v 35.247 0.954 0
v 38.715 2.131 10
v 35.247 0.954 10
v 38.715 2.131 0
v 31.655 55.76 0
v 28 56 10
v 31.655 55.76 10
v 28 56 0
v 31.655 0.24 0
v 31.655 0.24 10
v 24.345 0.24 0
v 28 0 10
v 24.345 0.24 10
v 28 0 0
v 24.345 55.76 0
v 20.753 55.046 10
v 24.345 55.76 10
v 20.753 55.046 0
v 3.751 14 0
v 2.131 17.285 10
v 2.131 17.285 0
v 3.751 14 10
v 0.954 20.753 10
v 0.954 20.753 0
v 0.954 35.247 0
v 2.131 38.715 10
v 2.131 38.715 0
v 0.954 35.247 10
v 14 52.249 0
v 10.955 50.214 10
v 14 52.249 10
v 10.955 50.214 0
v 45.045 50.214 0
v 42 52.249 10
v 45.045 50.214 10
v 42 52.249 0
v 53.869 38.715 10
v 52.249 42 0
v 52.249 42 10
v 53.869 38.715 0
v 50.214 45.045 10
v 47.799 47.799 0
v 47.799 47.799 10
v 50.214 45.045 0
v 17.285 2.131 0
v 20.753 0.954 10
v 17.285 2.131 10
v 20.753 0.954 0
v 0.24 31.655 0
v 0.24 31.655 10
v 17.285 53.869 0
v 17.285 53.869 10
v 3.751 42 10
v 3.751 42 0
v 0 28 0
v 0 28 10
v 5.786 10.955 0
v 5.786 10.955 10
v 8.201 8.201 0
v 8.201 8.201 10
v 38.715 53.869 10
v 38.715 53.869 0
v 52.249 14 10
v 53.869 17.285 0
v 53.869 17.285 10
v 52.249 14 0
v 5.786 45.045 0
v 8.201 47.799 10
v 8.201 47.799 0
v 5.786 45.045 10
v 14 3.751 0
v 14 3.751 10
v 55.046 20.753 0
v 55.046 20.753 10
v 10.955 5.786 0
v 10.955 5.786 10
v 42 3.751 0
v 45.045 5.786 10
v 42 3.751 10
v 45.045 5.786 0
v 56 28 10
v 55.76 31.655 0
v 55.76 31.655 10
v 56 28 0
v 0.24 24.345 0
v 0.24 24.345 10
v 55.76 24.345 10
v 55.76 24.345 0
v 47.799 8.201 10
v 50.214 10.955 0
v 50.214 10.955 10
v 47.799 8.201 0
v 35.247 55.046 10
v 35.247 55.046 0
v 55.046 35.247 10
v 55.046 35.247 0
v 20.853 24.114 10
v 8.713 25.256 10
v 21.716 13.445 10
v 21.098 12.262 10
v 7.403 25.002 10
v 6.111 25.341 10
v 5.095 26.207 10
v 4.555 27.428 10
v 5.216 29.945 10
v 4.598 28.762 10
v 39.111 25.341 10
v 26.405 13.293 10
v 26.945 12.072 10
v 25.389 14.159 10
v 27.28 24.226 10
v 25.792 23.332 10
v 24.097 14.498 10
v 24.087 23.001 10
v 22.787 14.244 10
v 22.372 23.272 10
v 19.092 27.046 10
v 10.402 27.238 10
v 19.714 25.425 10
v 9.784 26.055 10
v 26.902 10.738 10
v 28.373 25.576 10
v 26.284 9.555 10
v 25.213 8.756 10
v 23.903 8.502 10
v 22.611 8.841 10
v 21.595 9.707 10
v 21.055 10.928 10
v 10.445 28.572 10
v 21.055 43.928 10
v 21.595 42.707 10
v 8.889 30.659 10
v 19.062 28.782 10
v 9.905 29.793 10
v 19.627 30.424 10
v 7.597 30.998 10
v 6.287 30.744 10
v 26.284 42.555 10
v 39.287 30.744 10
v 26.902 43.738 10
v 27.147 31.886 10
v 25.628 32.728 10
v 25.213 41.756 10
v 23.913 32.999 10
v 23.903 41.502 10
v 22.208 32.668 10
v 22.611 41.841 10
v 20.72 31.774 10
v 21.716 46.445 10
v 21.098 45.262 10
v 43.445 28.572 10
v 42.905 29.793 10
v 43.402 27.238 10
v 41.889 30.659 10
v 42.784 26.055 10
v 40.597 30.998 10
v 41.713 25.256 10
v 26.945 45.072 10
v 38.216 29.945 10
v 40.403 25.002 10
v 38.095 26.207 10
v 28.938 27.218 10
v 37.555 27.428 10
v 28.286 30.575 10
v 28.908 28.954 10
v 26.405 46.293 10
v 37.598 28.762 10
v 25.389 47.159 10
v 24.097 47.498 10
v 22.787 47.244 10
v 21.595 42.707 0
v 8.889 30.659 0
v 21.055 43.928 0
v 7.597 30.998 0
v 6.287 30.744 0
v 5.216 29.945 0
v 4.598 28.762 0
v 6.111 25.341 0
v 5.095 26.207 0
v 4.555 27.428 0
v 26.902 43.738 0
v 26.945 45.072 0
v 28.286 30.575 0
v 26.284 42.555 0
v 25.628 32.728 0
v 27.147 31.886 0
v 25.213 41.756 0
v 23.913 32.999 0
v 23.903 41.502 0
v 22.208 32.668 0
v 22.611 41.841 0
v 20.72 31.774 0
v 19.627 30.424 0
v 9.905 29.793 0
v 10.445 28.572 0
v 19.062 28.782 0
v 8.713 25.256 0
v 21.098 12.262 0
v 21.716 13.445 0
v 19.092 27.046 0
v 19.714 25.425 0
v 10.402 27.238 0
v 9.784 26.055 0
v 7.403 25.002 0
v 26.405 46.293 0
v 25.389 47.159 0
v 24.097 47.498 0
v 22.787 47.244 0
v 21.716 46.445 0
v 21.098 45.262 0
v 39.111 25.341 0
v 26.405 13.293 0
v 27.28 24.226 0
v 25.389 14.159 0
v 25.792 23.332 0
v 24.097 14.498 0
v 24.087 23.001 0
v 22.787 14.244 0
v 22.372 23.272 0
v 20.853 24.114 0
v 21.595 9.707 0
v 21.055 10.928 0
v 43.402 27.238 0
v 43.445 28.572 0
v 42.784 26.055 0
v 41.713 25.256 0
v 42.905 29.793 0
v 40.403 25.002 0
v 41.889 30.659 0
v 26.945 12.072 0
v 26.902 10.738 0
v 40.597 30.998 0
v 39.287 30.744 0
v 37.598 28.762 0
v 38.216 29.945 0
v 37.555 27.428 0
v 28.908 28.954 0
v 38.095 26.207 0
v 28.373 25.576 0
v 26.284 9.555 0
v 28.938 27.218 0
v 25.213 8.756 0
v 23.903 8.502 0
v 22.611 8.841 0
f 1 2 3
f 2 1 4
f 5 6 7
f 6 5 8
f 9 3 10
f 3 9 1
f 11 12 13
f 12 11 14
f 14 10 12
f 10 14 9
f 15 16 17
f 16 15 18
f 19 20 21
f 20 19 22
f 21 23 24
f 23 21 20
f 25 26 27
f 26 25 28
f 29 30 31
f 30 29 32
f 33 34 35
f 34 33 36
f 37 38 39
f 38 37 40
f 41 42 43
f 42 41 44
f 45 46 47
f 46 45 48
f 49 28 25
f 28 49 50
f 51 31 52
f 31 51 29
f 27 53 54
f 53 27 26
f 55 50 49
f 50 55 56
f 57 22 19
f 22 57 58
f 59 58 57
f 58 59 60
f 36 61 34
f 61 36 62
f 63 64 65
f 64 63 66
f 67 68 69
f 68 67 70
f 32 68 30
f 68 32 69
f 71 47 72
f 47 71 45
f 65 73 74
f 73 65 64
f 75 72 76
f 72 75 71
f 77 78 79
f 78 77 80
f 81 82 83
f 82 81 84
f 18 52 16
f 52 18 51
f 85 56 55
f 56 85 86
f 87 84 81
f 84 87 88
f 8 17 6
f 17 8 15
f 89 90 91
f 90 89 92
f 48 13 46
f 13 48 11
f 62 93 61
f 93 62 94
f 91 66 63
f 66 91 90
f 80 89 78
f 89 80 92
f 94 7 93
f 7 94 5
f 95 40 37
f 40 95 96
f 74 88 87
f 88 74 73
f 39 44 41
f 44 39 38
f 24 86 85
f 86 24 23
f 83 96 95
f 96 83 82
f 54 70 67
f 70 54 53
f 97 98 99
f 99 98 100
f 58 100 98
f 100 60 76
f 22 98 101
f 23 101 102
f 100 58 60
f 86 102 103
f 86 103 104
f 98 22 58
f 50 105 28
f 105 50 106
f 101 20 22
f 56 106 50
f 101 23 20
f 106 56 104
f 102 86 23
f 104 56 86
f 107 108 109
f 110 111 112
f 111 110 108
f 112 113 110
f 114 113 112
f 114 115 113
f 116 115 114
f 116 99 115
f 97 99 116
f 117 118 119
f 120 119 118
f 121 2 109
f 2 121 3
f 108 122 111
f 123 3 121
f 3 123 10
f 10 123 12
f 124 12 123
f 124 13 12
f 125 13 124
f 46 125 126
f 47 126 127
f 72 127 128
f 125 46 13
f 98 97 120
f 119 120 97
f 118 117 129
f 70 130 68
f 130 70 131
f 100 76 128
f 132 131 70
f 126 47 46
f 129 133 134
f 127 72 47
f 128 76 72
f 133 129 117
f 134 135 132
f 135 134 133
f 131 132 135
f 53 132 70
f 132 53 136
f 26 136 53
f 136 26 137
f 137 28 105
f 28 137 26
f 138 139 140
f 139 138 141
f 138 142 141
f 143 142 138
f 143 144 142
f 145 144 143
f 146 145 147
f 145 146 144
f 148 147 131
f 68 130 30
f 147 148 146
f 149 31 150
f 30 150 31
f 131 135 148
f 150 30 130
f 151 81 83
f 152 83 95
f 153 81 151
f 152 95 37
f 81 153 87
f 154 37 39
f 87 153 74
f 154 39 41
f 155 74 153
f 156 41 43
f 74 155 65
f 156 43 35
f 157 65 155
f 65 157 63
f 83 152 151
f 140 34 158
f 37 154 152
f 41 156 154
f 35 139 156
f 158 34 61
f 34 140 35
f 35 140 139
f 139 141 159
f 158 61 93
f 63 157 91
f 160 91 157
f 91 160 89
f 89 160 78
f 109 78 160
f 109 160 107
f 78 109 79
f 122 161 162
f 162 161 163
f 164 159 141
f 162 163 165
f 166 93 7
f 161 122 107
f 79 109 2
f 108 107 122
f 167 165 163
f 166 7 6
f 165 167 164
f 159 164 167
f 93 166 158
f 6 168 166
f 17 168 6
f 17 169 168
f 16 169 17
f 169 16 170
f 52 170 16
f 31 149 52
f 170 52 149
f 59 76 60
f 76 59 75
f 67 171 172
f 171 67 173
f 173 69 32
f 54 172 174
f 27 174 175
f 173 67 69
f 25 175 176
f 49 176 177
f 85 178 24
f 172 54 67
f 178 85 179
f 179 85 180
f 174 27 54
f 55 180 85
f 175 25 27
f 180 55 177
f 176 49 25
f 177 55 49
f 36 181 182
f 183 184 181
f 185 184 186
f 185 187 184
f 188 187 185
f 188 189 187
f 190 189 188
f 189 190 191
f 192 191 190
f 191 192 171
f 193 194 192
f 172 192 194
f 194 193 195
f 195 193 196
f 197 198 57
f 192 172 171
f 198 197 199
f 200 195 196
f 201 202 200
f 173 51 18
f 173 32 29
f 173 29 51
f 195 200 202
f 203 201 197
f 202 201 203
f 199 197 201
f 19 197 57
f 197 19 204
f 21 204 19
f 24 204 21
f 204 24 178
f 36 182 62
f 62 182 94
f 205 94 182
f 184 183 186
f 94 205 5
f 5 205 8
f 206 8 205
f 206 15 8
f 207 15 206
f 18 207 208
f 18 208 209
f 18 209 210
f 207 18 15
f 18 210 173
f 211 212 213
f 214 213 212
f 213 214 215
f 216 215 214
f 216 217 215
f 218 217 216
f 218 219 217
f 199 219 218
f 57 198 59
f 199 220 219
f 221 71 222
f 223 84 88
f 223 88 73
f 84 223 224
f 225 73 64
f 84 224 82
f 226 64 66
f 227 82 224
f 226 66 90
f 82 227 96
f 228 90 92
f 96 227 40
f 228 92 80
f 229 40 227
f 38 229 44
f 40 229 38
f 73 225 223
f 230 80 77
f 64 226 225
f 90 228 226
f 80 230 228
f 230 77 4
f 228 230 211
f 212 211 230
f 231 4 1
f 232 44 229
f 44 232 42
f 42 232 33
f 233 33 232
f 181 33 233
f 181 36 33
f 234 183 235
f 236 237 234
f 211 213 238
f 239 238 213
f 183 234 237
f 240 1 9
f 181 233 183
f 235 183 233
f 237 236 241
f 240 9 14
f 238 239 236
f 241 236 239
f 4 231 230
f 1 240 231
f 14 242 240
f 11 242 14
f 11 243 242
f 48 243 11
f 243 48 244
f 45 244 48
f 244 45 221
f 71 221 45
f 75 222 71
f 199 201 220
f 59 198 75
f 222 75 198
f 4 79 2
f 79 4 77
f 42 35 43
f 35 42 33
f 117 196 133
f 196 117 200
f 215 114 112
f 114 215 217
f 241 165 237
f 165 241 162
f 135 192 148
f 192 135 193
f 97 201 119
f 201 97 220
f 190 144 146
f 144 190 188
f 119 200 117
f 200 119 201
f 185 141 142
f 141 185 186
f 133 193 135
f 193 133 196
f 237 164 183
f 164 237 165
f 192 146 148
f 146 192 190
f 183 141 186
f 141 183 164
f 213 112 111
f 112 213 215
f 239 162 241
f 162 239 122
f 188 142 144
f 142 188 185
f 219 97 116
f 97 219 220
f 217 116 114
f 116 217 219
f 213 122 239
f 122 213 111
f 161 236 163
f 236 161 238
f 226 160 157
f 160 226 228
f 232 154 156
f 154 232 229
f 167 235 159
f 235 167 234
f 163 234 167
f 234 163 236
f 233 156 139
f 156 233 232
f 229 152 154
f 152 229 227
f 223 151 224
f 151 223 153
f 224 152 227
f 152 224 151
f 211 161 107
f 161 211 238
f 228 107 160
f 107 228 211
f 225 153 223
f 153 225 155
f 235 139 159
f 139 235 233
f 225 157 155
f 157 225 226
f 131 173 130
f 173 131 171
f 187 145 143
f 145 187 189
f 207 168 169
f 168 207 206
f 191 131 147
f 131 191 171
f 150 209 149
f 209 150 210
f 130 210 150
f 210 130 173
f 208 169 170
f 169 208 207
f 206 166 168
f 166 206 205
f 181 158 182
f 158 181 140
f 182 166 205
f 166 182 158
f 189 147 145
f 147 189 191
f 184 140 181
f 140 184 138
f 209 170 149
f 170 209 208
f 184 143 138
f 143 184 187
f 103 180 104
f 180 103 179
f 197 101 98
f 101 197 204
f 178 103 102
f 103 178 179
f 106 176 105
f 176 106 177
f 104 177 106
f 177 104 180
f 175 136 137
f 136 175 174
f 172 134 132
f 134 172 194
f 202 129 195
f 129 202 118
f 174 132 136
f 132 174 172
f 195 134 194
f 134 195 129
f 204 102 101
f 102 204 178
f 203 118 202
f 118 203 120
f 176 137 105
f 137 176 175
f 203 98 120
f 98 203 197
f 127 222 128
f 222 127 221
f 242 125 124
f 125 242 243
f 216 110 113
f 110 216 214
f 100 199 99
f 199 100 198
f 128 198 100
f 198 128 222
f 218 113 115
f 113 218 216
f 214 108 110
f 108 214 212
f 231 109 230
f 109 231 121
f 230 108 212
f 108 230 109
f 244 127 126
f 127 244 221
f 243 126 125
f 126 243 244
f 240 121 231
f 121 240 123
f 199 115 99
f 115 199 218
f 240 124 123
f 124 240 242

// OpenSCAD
$fn = 32;

// ----------------------------------------------------------------------
// Cam plate: eccentric cam, base R28
// ----------------------------------------------------------------------

// --- parameters (mm) ---
base_r = 28;              // base circle radius
lobe_h = 8;               // cam lobe rise
bore_r = 5;               // shaft bore radius
plate_t = 10;             // plate thickness, Z (extrusion height)
ecc = 4;                  // disc eccentricity
ring_r = 16.5;            // lightening ring radius
bolt_r = 3;               // lightening hole radius
fit_tol = 0.05;           // declared fit tolerance (prompt contract)
free_tol = 0.3;           // declared free tolerance (prompt contract)

profile = [[56, 28], [55.76, 31.655], [55.046, 35.247], [53.869, 38.715], [52.249, 42], [50.214, 45.045], [47.799, 47.799], [45.045, 50.214], [42, 52.249], [38.715, 53.869], [35.247, 55.046], [31.655, 55.76], [28, 56], [24.345, 55.76], [20.753, 55.046], [17.285, 53.869], [14, 52.249], [10.955, 50.214], [8.201, 47.799], [5.786, 45.045], [3.751, 42], [2.131, 38.715], [0.954, 35.247], [0.24, 31.655], [0, 28], [0.24, 24.345], [0.954, 20.753], [2.131, 17.285], [3.751, 14], [5.786, 10.955], [8.201, 8.201], [10.955, 5.786], [14, 3.751], [17.285, 2.131], [20.753, 0.954], [24.345, 0.24], [28, 0], [31.655, 0.24], [35.247, 0.954], [38.715, 2.131], [42, 3.751], [45.045, 5.786], [47.799, 8.201], [50.214, 10.955], [52.249, 14], [53.869, 17.285], [55.046, 20.753], [55.76, 24.345]];  // primary outline, 48 points, counter clockwise
void_1 = [[28.908, 28.954], [28.286, 30.575], [27.147, 31.886], [25.628, 32.728], [23.913, 32.999], [22.208, 32.668], [20.72, 31.774], [19.627, 30.424], [19.062, 28.782], [19.092, 27.046], [19.714, 25.425], [20.853, 24.114], [22.372, 23.272], [24.087, 23.001], [25.792, 23.332], [27.28, 24.226], [28.373, 25.576], [28.938, 27.218]];  // shaft bore, 18 points
void_2 = [[43.445, 28.572], [42.905, 29.793], [41.889, 30.659], [40.597, 30.998], [39.287, 30.744], [38.216, 29.945], [37.598, 28.762], [37.555, 27.428], [38.095, 26.207], [39.111, 25.341], [40.403, 25.002], [41.713, 25.256], [42.784, 26.055], [43.402, 27.238]];  // lightening hole 1, 14 points
void_3 = [[26.945, 45.072], [26.405, 46.293], [25.389, 47.159], [24.097, 47.498], [22.787, 47.244], [21.716, 46.445], [21.098, 45.262], [21.055, 43.928], [21.595, 42.707], [22.611, 41.841], [23.903, 41.502], [25.213, 41.756], [26.284, 42.555], [26.902, 43.738]];  // lightening hole 2, 14 points
void_4 = [[10.445, 28.572], [9.905, 29.793], [8.889, 30.659], [7.597, 30.998], [6.287, 30.744], [5.216, 29.945], [4.598, 28.762], [4.555, 27.428], [5.095, 26.207], [6.111, 25.341], [7.403, 25.002], [8.713, 25.256], [9.784, 26.055], [10.402, 27.238]];  // lightening hole 3, 14 points
void_5 = [[26.945, 12.072], [26.405, 13.293], [25.389, 14.159], [24.097, 14.498], [22.787, 14.244], [21.716, 13.445], [21.098, 12.262], [21.055, 10.928], [21.595, 9.707], [22.611, 8.841], [23.903, 8.502], [25.213, 8.756], [26.284, 9.555], [26.902, 10.738]];  // lightening hole 4, 14 points

// --- the one profile operation ---
difference() {
  linear_extrude(height = plate_t) polygon(points = profile);
  translate([0, 0, -1])
    linear_extrude(height = plate_t + 2) polygon(points = void_1);
  translate([0, 0, -1])
    linear_extrude(height = plate_t + 2) polygon(points = void_2);
  translate([0, 0, -1])
    linear_extrude(height = plate_t + 2) polygon(points = void_3);
  translate([0, 0, -1])
    linear_extrude(height = plate_t + 2) polygon(points = void_4);
  translate([0, 0, -1])
    linear_extrude(height = plate_t + 2) polygon(points = void_5);
}
